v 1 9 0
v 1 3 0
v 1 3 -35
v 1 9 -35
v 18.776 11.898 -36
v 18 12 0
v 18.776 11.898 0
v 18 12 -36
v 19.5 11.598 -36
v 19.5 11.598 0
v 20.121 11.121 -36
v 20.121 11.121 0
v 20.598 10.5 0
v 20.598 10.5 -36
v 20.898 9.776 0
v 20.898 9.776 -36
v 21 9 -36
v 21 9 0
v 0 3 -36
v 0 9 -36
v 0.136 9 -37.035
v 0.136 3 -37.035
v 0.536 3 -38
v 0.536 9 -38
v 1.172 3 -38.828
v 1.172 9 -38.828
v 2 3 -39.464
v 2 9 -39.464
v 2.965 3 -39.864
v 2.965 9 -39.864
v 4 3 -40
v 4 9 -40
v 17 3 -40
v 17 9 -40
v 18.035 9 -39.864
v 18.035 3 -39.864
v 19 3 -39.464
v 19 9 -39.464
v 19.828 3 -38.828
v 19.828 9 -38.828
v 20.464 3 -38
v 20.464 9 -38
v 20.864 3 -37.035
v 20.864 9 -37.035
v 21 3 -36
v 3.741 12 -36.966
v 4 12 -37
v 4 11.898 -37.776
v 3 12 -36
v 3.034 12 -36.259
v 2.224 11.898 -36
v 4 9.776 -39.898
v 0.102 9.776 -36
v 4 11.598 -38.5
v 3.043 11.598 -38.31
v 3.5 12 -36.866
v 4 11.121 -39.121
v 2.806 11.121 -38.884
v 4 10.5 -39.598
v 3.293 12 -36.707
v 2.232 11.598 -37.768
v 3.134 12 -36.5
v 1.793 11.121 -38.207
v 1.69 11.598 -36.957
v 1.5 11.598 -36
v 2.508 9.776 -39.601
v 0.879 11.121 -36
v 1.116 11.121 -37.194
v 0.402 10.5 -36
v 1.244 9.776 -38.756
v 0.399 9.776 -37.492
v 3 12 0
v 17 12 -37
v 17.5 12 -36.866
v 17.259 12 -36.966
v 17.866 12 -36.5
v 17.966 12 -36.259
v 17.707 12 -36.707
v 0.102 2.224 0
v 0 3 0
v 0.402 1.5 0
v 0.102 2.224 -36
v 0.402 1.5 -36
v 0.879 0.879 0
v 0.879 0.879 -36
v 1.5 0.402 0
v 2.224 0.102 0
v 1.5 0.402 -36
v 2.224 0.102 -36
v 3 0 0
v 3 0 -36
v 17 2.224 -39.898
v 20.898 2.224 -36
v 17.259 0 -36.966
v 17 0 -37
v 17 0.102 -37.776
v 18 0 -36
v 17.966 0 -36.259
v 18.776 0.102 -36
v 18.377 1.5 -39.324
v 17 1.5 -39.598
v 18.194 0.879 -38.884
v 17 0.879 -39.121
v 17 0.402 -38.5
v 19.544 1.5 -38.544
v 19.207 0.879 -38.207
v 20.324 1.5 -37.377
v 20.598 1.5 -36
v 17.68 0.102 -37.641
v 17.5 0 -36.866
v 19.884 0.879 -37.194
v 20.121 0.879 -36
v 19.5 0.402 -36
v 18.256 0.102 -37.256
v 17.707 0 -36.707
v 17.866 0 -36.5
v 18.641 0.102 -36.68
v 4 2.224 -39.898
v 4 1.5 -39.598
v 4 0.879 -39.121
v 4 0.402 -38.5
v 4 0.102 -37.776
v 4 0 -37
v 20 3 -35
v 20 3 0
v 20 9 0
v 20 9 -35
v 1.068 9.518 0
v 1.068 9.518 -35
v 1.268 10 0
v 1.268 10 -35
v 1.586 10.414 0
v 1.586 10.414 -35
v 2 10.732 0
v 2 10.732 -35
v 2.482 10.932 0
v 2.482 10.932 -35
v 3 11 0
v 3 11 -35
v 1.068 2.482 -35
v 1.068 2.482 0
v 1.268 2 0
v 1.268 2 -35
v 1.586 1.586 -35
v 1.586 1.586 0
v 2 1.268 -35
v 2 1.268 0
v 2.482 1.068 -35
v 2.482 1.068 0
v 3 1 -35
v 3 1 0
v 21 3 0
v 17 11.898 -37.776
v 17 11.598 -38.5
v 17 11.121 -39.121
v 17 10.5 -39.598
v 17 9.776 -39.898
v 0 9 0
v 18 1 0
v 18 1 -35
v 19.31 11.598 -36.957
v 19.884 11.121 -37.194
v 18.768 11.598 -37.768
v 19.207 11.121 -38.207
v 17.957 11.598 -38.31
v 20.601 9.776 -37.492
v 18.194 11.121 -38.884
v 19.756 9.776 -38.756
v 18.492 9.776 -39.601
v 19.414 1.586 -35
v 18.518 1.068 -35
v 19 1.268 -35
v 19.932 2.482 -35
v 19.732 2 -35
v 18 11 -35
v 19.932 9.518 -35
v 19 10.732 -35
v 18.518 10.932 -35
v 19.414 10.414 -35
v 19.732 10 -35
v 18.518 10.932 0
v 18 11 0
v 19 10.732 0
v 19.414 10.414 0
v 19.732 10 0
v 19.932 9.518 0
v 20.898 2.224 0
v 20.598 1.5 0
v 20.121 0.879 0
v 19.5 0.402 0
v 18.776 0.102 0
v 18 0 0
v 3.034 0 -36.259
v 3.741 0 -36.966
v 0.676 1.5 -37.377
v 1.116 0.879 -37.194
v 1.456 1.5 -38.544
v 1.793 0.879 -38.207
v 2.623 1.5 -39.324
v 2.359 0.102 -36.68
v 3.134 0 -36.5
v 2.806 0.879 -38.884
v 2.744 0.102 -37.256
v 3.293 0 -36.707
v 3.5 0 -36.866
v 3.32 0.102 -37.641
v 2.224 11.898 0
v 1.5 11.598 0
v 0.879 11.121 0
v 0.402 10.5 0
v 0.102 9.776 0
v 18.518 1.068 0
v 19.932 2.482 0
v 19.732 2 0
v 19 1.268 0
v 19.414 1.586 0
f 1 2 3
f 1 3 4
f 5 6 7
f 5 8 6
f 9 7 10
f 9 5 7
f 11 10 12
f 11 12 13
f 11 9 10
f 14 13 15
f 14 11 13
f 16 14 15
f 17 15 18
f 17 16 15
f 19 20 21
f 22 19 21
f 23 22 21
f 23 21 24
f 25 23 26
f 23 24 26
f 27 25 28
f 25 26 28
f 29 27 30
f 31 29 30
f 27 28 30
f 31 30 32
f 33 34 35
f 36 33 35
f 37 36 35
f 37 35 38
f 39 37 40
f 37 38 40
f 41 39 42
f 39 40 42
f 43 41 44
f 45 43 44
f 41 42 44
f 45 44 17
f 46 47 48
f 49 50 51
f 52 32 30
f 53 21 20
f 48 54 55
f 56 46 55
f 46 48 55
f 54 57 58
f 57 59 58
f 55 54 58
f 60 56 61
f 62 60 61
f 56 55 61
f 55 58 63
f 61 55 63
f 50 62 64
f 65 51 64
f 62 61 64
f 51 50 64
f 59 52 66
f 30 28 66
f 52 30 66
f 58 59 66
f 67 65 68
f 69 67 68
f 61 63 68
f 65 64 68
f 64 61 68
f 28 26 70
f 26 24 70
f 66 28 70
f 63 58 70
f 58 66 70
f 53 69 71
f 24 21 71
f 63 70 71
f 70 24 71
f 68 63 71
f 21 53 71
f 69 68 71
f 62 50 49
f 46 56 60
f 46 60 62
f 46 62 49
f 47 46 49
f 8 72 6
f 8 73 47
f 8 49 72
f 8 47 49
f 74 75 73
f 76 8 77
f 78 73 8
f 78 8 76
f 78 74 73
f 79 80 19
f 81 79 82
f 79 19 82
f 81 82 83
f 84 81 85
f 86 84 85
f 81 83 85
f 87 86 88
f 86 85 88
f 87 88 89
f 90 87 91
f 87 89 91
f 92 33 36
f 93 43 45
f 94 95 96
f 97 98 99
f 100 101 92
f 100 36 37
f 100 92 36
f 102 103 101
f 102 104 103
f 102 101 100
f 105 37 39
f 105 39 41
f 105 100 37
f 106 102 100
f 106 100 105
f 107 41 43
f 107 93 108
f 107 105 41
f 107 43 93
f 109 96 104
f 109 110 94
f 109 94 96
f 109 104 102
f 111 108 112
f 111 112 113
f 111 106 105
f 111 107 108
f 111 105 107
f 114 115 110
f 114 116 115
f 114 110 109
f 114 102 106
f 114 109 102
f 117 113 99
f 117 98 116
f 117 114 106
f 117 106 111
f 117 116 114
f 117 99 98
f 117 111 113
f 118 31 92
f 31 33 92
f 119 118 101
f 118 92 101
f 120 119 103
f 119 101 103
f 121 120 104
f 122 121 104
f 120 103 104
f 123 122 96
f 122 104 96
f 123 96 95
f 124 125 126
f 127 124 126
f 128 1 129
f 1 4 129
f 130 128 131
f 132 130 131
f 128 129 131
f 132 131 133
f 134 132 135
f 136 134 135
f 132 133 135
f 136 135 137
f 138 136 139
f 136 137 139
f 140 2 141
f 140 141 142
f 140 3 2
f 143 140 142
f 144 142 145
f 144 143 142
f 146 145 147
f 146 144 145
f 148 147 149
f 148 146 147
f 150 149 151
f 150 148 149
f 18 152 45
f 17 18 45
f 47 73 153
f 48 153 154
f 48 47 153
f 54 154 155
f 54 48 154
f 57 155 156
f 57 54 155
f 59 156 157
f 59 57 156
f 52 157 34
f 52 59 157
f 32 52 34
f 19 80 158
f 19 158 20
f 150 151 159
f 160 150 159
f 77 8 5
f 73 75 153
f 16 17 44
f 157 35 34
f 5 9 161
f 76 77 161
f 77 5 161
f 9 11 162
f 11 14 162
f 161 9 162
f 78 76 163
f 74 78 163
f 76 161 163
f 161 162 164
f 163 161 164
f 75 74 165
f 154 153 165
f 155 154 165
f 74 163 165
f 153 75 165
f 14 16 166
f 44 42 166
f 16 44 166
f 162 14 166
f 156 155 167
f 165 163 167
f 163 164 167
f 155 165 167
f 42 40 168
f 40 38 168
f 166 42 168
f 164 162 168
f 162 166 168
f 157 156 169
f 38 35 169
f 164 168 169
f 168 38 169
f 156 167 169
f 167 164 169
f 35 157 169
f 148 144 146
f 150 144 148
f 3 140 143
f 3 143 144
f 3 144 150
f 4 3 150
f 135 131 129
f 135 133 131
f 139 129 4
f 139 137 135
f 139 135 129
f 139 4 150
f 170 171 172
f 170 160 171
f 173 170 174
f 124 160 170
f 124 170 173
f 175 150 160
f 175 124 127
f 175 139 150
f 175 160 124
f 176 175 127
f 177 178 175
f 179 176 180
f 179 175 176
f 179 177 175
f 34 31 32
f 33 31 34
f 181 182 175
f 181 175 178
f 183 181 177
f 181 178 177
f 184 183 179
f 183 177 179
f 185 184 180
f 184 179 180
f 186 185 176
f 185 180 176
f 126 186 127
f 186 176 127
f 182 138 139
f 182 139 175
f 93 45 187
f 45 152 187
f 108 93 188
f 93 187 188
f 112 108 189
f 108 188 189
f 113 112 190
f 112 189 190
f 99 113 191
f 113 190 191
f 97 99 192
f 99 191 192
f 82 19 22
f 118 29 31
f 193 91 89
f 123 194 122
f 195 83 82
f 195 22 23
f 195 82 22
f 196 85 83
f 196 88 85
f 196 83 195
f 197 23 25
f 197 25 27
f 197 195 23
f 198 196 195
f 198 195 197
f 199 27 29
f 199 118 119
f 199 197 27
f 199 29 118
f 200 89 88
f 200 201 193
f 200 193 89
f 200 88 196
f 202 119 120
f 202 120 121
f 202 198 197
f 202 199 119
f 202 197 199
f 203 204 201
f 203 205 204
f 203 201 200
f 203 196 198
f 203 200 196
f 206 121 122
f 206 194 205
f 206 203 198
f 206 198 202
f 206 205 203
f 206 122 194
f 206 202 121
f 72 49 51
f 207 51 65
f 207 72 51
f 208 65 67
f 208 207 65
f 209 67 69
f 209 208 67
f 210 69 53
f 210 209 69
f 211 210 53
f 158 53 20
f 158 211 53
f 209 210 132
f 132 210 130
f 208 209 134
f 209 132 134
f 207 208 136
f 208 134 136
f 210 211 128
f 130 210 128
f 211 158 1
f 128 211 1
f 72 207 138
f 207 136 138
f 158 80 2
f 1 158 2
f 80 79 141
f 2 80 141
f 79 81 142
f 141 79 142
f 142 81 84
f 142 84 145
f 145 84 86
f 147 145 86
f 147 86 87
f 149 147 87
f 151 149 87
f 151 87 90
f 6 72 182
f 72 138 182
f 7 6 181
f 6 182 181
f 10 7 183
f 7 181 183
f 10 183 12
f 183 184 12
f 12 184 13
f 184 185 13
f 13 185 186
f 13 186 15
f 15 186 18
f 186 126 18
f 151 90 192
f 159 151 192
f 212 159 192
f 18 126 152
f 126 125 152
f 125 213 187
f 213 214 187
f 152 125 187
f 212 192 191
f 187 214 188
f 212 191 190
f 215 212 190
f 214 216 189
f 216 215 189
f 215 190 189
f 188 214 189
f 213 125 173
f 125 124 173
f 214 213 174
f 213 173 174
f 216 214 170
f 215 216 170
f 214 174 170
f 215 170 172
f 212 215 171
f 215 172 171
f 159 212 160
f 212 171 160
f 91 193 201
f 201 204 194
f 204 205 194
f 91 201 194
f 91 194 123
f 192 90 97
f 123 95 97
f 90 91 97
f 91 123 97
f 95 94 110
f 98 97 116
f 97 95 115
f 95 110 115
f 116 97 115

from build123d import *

# Parameters (mm, degrees)
SKETCH1_W           = 21
SKETCH1_H           = 40
BOSS_EXTRUDE1_DEPTH = 12
SKETCH4_W           = 19
SKETCH4_H           = 10
CUT_EXTRUDE2_DEPTH  = 35
FILLET5_R           = 4
FILLET6_R           = 3
FILLET8_R           = 2


with BuildPart() as part:
    # Sketch1 → Boss-Extrude1 (new body)
    with BuildSketch(Plane(origin=(0, 0, 0), x_dir=(1, 0, 0), z_dir=(0, 1, 0))):
        with Locations((10.5, 20)):
            Rectangle(SKETCH1_W, SKETCH1_H)
    extrude(amount=BOSS_EXTRUDE1_DEPTH)

    # Sketch4 → Cut-Extrude2 (cut)
    with BuildSketch(Plane.XY):
        with Locations((10.5, 6)):
            Rectangle(SKETCH4_W, SKETCH4_H)
    extrude(amount=-CUT_EXTRUDE2_DEPTH, mode=Mode.SUBTRACT)

    # Fillet5
    fillet5_edges = [part.edges().sort_by_distance(p)[0] for p in [
        (0, 6, -40),
        (21, 6, -40),
    ]]
    fillet(fillet5_edges, radius=FILLET5_R)

    # Fillet6
    fillet6_edges = [part.edges().sort_by_distance(p)[0] for p in [
        (21, 12, -18),
        (0, 0, -18),
        (0, 12, -18),
        (10.5, 0, -40),
        (19.828427125, 0, -38.828427125),
        (1.171572875, 0, -38.828427125),
        (10.5, 12, -40),
        (19.828427125, 12, -38.828427125),
        (1.171572875, 12, -38.828427125),
        (21, 0, -18),
    ]]
    fillet(fillet6_edges, radius=FILLET6_R)

    # Fillet8
    fillet8_edges = [part.edges().sort_by_distance(p)[0] for p in [
        (20, 11, -17.5),
        (20, 1, -17.5),
        (1, 1, -17.5),
        (1, 11, -17.5),
    ]]
    fillet(fillet8_edges, radius=FILLET8_R)


solid = part.part
